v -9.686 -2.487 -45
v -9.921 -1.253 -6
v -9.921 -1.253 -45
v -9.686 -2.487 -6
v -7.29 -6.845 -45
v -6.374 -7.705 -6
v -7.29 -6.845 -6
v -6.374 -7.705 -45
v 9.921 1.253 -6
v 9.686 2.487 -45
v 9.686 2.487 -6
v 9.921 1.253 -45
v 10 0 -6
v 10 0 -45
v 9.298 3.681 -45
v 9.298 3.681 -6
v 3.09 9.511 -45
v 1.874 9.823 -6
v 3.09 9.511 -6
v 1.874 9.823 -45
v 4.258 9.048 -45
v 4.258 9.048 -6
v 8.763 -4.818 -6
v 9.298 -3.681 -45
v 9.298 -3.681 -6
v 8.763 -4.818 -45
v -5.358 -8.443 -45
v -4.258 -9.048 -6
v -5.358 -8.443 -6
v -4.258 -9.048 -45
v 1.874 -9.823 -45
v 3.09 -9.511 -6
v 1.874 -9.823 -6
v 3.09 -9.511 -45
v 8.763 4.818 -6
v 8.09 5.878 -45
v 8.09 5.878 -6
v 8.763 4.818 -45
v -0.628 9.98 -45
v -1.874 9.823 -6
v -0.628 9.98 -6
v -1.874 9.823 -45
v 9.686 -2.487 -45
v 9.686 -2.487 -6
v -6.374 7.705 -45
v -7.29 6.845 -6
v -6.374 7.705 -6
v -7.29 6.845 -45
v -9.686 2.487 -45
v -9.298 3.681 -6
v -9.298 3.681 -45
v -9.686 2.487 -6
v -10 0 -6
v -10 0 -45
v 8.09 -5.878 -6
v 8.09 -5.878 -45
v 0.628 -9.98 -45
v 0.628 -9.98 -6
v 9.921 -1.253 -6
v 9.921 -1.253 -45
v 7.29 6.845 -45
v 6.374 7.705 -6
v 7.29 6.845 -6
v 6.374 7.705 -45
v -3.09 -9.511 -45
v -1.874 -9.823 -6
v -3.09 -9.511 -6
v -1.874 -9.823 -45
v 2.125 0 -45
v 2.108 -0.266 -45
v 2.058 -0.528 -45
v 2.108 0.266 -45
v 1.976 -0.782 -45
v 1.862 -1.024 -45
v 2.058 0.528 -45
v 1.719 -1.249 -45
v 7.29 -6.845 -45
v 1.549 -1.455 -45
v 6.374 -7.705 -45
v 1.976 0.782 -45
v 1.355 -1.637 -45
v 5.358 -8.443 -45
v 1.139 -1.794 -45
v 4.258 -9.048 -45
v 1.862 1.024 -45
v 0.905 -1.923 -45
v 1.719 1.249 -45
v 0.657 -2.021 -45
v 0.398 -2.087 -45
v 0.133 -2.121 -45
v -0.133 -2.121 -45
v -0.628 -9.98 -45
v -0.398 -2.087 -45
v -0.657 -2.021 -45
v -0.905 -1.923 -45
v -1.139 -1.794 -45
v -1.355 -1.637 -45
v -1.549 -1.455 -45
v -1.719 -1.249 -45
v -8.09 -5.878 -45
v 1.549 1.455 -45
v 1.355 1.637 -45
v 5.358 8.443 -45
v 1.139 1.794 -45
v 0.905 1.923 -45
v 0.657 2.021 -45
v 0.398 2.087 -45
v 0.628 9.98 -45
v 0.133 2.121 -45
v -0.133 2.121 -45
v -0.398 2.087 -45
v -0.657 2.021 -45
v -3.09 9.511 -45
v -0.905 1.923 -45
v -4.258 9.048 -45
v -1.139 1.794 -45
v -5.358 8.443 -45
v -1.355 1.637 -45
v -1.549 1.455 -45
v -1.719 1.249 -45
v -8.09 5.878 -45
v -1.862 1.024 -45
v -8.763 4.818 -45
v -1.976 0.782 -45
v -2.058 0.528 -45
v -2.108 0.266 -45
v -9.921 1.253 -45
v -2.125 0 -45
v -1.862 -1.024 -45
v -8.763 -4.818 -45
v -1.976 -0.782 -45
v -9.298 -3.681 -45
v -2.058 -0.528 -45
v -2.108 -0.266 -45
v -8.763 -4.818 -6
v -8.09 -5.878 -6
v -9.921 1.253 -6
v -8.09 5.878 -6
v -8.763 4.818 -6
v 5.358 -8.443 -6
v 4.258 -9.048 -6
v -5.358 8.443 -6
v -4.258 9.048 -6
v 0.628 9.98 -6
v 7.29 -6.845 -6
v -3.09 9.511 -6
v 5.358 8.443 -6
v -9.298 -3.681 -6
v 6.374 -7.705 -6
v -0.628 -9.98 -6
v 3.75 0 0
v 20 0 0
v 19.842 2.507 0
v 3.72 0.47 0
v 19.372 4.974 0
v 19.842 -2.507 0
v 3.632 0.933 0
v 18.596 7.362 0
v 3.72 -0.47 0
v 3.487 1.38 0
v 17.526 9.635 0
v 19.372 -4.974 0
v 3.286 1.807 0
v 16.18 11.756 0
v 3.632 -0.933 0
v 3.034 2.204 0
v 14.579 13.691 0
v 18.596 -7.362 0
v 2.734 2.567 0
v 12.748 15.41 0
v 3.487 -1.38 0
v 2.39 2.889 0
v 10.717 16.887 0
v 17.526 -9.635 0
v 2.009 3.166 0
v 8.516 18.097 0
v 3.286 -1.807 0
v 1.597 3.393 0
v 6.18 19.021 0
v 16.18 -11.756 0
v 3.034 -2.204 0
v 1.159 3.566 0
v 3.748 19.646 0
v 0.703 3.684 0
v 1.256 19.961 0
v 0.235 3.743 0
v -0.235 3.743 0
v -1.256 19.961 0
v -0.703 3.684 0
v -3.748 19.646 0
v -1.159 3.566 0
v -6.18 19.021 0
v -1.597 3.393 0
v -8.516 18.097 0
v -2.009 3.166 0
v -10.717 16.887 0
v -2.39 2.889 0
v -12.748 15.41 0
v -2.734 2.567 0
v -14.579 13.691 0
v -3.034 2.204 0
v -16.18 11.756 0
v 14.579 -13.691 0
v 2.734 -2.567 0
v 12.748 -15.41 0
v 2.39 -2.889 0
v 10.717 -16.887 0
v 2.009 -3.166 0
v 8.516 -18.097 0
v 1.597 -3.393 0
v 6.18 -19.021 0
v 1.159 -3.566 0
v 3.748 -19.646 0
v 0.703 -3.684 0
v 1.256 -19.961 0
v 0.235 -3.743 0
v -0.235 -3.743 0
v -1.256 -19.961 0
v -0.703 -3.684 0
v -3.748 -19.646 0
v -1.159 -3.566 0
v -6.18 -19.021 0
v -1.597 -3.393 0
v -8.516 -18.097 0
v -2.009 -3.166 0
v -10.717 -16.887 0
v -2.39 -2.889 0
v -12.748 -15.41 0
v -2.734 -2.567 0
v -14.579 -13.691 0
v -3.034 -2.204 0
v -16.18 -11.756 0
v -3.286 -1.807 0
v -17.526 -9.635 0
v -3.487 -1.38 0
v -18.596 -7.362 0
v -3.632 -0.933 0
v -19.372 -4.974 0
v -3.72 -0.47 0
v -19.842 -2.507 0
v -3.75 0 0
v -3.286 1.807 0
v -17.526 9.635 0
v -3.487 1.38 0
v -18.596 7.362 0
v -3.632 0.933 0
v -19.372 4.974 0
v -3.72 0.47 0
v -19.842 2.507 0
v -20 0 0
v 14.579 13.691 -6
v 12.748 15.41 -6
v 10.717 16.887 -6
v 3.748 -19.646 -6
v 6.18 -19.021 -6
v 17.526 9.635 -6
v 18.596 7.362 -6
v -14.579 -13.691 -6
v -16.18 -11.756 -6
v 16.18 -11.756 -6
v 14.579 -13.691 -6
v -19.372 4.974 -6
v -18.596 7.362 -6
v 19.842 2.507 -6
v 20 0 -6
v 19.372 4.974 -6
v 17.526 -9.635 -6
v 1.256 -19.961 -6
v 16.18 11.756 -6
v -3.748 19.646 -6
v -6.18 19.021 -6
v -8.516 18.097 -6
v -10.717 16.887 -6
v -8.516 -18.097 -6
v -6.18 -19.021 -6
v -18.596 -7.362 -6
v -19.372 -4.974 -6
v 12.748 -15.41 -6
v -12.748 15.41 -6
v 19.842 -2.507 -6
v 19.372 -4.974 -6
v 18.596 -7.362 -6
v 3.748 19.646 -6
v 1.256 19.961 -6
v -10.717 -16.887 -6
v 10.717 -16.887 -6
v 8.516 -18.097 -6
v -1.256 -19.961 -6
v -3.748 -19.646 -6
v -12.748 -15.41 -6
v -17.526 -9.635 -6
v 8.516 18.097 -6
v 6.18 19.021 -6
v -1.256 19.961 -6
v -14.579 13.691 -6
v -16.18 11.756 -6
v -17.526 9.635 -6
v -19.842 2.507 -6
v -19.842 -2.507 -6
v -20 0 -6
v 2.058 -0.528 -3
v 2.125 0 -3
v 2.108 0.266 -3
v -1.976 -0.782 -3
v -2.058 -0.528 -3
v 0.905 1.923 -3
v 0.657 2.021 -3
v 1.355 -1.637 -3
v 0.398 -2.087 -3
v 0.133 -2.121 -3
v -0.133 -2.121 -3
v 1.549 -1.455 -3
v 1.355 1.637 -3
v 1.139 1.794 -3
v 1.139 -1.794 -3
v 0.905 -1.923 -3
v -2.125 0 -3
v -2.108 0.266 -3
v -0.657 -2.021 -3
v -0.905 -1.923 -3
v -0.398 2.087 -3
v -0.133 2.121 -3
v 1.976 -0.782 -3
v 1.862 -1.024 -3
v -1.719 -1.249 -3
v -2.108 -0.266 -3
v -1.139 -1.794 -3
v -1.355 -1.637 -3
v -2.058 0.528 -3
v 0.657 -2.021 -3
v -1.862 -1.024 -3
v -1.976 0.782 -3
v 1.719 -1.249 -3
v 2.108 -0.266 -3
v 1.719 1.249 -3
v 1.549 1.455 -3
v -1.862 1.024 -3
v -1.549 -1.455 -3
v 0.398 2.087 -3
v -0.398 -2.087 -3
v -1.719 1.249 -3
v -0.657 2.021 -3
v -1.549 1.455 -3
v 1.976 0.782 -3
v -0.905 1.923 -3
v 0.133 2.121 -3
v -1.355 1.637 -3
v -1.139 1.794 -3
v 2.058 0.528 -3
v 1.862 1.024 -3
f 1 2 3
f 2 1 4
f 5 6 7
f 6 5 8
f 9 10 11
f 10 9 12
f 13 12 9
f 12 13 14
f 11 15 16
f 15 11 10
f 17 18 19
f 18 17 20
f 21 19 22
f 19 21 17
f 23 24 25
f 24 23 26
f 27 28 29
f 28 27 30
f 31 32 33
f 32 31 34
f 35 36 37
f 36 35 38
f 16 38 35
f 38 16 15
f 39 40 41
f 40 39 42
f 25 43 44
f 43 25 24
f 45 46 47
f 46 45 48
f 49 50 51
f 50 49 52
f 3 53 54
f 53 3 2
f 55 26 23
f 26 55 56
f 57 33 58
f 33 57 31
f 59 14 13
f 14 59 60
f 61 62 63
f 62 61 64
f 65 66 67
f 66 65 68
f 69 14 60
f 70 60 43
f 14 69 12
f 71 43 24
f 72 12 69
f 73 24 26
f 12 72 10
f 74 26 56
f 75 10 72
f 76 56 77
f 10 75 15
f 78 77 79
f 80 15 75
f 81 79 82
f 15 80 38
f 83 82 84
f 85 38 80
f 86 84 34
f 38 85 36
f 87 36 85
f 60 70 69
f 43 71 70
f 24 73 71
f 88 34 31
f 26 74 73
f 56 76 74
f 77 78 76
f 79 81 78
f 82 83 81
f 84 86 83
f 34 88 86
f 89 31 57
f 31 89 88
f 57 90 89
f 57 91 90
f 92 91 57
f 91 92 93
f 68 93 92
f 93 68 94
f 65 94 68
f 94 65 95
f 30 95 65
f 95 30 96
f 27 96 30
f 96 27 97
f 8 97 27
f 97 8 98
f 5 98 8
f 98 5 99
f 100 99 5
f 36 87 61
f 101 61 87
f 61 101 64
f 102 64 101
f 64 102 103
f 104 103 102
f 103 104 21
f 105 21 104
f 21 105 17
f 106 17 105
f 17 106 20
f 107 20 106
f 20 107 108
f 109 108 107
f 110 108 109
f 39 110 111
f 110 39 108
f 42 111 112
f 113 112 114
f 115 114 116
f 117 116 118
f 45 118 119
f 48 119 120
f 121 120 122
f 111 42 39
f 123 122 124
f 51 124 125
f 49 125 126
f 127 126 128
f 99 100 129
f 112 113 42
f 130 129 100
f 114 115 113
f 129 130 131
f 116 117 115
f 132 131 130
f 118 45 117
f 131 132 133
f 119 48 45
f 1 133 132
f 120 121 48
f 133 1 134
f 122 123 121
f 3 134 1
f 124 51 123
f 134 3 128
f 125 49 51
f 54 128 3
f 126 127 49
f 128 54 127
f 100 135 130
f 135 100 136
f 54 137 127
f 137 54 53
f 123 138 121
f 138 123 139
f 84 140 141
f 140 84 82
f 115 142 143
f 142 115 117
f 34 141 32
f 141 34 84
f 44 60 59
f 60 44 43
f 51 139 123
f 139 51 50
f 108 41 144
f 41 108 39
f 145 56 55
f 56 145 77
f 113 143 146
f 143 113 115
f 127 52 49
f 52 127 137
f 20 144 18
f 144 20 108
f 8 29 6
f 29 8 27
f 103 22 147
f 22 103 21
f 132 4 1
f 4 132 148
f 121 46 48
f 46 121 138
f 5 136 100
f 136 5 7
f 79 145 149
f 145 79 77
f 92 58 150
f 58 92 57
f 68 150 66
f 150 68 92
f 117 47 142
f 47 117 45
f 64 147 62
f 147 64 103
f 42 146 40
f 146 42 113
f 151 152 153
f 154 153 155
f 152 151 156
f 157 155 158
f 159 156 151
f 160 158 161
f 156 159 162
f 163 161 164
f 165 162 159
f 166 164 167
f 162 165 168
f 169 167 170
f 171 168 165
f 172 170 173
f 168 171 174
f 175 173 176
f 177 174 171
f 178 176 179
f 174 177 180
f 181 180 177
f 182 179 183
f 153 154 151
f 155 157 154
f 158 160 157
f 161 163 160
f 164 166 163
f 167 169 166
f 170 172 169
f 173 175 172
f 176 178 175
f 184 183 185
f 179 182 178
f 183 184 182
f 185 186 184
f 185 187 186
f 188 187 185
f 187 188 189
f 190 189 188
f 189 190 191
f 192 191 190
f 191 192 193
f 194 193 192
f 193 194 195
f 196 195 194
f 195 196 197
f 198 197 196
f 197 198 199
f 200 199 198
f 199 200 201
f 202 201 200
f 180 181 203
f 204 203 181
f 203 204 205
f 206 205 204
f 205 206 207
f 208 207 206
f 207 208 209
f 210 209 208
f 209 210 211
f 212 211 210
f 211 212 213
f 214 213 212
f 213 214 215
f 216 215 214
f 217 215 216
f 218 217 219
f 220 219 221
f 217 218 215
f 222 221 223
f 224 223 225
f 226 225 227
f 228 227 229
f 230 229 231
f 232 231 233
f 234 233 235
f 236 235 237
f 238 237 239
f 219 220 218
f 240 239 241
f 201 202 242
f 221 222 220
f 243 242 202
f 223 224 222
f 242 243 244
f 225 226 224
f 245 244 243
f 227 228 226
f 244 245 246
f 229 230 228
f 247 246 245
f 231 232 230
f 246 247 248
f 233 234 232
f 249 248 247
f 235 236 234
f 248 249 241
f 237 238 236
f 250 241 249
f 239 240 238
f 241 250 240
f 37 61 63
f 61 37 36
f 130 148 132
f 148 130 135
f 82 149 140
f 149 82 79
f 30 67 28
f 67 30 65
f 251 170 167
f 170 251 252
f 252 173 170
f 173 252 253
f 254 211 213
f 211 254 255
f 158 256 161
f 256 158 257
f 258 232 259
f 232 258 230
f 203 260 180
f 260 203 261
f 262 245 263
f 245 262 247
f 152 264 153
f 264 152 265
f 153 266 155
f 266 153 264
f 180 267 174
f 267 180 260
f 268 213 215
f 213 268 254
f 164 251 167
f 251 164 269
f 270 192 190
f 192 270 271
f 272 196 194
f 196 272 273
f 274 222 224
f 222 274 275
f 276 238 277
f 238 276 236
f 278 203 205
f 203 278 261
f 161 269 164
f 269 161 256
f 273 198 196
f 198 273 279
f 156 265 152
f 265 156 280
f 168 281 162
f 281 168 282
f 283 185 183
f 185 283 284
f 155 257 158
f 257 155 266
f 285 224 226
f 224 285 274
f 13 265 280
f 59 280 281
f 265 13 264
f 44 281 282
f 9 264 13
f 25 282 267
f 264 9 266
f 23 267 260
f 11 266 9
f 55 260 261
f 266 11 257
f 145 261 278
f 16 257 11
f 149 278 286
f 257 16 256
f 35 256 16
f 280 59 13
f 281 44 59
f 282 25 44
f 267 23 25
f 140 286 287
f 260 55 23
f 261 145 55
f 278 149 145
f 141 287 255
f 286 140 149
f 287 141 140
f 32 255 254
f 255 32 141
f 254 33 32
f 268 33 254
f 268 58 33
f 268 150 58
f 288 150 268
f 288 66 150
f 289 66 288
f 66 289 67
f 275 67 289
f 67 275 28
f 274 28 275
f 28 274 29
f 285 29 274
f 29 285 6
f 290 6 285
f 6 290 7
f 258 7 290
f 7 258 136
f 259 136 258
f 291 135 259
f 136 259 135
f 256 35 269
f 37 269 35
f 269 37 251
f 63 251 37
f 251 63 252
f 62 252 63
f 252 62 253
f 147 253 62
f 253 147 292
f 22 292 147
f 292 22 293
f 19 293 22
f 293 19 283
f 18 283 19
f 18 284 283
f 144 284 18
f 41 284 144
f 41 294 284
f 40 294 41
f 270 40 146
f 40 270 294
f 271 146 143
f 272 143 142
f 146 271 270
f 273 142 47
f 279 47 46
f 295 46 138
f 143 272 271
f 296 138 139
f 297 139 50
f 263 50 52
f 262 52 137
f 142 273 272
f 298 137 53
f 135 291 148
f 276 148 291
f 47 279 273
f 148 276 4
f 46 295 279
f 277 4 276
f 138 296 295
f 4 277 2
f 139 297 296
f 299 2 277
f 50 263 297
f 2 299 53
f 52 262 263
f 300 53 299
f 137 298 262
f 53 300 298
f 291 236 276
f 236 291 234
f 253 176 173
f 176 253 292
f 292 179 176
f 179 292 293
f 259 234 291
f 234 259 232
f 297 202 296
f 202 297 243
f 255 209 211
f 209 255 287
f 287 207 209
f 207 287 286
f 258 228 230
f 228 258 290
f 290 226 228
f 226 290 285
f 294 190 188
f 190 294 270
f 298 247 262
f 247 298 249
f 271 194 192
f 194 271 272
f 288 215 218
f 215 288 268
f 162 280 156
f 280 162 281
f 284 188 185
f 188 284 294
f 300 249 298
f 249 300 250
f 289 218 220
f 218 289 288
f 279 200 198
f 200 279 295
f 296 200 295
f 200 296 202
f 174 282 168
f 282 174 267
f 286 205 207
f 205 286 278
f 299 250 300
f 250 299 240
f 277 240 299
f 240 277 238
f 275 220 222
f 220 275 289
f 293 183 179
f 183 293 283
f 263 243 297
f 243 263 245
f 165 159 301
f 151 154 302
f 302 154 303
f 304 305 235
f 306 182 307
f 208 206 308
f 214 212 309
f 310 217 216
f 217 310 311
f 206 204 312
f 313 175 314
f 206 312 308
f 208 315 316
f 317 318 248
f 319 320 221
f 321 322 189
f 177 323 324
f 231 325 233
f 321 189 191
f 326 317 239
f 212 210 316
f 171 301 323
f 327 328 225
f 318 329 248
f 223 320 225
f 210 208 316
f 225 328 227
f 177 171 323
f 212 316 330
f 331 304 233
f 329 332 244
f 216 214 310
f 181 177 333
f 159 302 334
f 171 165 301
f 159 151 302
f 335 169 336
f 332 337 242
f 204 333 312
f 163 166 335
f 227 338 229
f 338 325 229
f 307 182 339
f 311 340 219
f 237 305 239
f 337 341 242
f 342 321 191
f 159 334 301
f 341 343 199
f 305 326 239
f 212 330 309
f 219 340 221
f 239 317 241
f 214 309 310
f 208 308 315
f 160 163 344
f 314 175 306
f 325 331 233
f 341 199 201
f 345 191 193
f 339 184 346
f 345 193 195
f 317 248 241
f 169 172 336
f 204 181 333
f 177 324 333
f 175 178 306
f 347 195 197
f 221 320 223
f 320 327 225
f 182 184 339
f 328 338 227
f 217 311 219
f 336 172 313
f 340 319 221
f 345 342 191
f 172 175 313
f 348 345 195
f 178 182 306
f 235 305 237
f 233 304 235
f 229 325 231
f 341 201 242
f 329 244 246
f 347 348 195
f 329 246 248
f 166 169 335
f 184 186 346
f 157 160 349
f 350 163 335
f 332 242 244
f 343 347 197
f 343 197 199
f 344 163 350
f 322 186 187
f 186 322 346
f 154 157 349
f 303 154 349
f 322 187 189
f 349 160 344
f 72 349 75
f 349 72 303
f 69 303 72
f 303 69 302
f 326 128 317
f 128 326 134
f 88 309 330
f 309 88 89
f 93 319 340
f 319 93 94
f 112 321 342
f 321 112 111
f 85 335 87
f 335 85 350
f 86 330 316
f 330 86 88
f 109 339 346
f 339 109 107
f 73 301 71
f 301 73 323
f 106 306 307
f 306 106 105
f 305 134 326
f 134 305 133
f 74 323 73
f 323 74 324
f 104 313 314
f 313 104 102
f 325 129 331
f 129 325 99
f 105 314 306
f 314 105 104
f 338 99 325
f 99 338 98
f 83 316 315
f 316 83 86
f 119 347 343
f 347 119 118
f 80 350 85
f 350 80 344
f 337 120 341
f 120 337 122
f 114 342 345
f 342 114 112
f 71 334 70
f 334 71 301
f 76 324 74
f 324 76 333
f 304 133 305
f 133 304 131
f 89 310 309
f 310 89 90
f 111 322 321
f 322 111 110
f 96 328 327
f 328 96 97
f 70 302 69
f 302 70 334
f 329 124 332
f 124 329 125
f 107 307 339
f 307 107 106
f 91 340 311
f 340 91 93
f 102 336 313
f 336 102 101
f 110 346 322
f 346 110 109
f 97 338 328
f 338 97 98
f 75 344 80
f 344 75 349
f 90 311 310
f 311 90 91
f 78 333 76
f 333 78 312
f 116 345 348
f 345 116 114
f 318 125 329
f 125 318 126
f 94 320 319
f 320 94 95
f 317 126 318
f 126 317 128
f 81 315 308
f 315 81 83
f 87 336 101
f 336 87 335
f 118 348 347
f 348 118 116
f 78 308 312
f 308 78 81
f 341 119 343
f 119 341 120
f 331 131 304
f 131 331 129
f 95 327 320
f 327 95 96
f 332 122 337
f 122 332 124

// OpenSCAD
$fn = 50;


difference() {
	union() {
		translate(v = [0, 0, -45.0000000000]) {
			cylinder(h = 45, r = 10.0000000000);
		}
		translate(v = [0, 0, -6.0000000000]) {
			cylinder(h = 6, r = 20.0000000000);
		}
	}
	union() {
		translate(v = [0, 0, 0]) {
			rotate(a = [0, 0, 0]) {
				difference() {
					union() {
						#translate(v = [0, 0, -45.0000000000]) {
							cylinder(h = 45, r = 2.0000000000);
						}
						#translate(v = [0, 0, -3]) {
							cylinder(h = 3, r = 10.0000000000, r1 = 2.1250000000, r2 = 3.7500000000);
						}
						#translate(v = [0, 0, -45.0000000000]) {
							cylinder(h = 45, r = 2.1250000000);
						}
						#translate(v = [0, 0, -45.0000000000]) {
							cylinder(h = 45, r = 2.0000000000);
						}
					}
					union();
				}
			}
		}
	}
}
